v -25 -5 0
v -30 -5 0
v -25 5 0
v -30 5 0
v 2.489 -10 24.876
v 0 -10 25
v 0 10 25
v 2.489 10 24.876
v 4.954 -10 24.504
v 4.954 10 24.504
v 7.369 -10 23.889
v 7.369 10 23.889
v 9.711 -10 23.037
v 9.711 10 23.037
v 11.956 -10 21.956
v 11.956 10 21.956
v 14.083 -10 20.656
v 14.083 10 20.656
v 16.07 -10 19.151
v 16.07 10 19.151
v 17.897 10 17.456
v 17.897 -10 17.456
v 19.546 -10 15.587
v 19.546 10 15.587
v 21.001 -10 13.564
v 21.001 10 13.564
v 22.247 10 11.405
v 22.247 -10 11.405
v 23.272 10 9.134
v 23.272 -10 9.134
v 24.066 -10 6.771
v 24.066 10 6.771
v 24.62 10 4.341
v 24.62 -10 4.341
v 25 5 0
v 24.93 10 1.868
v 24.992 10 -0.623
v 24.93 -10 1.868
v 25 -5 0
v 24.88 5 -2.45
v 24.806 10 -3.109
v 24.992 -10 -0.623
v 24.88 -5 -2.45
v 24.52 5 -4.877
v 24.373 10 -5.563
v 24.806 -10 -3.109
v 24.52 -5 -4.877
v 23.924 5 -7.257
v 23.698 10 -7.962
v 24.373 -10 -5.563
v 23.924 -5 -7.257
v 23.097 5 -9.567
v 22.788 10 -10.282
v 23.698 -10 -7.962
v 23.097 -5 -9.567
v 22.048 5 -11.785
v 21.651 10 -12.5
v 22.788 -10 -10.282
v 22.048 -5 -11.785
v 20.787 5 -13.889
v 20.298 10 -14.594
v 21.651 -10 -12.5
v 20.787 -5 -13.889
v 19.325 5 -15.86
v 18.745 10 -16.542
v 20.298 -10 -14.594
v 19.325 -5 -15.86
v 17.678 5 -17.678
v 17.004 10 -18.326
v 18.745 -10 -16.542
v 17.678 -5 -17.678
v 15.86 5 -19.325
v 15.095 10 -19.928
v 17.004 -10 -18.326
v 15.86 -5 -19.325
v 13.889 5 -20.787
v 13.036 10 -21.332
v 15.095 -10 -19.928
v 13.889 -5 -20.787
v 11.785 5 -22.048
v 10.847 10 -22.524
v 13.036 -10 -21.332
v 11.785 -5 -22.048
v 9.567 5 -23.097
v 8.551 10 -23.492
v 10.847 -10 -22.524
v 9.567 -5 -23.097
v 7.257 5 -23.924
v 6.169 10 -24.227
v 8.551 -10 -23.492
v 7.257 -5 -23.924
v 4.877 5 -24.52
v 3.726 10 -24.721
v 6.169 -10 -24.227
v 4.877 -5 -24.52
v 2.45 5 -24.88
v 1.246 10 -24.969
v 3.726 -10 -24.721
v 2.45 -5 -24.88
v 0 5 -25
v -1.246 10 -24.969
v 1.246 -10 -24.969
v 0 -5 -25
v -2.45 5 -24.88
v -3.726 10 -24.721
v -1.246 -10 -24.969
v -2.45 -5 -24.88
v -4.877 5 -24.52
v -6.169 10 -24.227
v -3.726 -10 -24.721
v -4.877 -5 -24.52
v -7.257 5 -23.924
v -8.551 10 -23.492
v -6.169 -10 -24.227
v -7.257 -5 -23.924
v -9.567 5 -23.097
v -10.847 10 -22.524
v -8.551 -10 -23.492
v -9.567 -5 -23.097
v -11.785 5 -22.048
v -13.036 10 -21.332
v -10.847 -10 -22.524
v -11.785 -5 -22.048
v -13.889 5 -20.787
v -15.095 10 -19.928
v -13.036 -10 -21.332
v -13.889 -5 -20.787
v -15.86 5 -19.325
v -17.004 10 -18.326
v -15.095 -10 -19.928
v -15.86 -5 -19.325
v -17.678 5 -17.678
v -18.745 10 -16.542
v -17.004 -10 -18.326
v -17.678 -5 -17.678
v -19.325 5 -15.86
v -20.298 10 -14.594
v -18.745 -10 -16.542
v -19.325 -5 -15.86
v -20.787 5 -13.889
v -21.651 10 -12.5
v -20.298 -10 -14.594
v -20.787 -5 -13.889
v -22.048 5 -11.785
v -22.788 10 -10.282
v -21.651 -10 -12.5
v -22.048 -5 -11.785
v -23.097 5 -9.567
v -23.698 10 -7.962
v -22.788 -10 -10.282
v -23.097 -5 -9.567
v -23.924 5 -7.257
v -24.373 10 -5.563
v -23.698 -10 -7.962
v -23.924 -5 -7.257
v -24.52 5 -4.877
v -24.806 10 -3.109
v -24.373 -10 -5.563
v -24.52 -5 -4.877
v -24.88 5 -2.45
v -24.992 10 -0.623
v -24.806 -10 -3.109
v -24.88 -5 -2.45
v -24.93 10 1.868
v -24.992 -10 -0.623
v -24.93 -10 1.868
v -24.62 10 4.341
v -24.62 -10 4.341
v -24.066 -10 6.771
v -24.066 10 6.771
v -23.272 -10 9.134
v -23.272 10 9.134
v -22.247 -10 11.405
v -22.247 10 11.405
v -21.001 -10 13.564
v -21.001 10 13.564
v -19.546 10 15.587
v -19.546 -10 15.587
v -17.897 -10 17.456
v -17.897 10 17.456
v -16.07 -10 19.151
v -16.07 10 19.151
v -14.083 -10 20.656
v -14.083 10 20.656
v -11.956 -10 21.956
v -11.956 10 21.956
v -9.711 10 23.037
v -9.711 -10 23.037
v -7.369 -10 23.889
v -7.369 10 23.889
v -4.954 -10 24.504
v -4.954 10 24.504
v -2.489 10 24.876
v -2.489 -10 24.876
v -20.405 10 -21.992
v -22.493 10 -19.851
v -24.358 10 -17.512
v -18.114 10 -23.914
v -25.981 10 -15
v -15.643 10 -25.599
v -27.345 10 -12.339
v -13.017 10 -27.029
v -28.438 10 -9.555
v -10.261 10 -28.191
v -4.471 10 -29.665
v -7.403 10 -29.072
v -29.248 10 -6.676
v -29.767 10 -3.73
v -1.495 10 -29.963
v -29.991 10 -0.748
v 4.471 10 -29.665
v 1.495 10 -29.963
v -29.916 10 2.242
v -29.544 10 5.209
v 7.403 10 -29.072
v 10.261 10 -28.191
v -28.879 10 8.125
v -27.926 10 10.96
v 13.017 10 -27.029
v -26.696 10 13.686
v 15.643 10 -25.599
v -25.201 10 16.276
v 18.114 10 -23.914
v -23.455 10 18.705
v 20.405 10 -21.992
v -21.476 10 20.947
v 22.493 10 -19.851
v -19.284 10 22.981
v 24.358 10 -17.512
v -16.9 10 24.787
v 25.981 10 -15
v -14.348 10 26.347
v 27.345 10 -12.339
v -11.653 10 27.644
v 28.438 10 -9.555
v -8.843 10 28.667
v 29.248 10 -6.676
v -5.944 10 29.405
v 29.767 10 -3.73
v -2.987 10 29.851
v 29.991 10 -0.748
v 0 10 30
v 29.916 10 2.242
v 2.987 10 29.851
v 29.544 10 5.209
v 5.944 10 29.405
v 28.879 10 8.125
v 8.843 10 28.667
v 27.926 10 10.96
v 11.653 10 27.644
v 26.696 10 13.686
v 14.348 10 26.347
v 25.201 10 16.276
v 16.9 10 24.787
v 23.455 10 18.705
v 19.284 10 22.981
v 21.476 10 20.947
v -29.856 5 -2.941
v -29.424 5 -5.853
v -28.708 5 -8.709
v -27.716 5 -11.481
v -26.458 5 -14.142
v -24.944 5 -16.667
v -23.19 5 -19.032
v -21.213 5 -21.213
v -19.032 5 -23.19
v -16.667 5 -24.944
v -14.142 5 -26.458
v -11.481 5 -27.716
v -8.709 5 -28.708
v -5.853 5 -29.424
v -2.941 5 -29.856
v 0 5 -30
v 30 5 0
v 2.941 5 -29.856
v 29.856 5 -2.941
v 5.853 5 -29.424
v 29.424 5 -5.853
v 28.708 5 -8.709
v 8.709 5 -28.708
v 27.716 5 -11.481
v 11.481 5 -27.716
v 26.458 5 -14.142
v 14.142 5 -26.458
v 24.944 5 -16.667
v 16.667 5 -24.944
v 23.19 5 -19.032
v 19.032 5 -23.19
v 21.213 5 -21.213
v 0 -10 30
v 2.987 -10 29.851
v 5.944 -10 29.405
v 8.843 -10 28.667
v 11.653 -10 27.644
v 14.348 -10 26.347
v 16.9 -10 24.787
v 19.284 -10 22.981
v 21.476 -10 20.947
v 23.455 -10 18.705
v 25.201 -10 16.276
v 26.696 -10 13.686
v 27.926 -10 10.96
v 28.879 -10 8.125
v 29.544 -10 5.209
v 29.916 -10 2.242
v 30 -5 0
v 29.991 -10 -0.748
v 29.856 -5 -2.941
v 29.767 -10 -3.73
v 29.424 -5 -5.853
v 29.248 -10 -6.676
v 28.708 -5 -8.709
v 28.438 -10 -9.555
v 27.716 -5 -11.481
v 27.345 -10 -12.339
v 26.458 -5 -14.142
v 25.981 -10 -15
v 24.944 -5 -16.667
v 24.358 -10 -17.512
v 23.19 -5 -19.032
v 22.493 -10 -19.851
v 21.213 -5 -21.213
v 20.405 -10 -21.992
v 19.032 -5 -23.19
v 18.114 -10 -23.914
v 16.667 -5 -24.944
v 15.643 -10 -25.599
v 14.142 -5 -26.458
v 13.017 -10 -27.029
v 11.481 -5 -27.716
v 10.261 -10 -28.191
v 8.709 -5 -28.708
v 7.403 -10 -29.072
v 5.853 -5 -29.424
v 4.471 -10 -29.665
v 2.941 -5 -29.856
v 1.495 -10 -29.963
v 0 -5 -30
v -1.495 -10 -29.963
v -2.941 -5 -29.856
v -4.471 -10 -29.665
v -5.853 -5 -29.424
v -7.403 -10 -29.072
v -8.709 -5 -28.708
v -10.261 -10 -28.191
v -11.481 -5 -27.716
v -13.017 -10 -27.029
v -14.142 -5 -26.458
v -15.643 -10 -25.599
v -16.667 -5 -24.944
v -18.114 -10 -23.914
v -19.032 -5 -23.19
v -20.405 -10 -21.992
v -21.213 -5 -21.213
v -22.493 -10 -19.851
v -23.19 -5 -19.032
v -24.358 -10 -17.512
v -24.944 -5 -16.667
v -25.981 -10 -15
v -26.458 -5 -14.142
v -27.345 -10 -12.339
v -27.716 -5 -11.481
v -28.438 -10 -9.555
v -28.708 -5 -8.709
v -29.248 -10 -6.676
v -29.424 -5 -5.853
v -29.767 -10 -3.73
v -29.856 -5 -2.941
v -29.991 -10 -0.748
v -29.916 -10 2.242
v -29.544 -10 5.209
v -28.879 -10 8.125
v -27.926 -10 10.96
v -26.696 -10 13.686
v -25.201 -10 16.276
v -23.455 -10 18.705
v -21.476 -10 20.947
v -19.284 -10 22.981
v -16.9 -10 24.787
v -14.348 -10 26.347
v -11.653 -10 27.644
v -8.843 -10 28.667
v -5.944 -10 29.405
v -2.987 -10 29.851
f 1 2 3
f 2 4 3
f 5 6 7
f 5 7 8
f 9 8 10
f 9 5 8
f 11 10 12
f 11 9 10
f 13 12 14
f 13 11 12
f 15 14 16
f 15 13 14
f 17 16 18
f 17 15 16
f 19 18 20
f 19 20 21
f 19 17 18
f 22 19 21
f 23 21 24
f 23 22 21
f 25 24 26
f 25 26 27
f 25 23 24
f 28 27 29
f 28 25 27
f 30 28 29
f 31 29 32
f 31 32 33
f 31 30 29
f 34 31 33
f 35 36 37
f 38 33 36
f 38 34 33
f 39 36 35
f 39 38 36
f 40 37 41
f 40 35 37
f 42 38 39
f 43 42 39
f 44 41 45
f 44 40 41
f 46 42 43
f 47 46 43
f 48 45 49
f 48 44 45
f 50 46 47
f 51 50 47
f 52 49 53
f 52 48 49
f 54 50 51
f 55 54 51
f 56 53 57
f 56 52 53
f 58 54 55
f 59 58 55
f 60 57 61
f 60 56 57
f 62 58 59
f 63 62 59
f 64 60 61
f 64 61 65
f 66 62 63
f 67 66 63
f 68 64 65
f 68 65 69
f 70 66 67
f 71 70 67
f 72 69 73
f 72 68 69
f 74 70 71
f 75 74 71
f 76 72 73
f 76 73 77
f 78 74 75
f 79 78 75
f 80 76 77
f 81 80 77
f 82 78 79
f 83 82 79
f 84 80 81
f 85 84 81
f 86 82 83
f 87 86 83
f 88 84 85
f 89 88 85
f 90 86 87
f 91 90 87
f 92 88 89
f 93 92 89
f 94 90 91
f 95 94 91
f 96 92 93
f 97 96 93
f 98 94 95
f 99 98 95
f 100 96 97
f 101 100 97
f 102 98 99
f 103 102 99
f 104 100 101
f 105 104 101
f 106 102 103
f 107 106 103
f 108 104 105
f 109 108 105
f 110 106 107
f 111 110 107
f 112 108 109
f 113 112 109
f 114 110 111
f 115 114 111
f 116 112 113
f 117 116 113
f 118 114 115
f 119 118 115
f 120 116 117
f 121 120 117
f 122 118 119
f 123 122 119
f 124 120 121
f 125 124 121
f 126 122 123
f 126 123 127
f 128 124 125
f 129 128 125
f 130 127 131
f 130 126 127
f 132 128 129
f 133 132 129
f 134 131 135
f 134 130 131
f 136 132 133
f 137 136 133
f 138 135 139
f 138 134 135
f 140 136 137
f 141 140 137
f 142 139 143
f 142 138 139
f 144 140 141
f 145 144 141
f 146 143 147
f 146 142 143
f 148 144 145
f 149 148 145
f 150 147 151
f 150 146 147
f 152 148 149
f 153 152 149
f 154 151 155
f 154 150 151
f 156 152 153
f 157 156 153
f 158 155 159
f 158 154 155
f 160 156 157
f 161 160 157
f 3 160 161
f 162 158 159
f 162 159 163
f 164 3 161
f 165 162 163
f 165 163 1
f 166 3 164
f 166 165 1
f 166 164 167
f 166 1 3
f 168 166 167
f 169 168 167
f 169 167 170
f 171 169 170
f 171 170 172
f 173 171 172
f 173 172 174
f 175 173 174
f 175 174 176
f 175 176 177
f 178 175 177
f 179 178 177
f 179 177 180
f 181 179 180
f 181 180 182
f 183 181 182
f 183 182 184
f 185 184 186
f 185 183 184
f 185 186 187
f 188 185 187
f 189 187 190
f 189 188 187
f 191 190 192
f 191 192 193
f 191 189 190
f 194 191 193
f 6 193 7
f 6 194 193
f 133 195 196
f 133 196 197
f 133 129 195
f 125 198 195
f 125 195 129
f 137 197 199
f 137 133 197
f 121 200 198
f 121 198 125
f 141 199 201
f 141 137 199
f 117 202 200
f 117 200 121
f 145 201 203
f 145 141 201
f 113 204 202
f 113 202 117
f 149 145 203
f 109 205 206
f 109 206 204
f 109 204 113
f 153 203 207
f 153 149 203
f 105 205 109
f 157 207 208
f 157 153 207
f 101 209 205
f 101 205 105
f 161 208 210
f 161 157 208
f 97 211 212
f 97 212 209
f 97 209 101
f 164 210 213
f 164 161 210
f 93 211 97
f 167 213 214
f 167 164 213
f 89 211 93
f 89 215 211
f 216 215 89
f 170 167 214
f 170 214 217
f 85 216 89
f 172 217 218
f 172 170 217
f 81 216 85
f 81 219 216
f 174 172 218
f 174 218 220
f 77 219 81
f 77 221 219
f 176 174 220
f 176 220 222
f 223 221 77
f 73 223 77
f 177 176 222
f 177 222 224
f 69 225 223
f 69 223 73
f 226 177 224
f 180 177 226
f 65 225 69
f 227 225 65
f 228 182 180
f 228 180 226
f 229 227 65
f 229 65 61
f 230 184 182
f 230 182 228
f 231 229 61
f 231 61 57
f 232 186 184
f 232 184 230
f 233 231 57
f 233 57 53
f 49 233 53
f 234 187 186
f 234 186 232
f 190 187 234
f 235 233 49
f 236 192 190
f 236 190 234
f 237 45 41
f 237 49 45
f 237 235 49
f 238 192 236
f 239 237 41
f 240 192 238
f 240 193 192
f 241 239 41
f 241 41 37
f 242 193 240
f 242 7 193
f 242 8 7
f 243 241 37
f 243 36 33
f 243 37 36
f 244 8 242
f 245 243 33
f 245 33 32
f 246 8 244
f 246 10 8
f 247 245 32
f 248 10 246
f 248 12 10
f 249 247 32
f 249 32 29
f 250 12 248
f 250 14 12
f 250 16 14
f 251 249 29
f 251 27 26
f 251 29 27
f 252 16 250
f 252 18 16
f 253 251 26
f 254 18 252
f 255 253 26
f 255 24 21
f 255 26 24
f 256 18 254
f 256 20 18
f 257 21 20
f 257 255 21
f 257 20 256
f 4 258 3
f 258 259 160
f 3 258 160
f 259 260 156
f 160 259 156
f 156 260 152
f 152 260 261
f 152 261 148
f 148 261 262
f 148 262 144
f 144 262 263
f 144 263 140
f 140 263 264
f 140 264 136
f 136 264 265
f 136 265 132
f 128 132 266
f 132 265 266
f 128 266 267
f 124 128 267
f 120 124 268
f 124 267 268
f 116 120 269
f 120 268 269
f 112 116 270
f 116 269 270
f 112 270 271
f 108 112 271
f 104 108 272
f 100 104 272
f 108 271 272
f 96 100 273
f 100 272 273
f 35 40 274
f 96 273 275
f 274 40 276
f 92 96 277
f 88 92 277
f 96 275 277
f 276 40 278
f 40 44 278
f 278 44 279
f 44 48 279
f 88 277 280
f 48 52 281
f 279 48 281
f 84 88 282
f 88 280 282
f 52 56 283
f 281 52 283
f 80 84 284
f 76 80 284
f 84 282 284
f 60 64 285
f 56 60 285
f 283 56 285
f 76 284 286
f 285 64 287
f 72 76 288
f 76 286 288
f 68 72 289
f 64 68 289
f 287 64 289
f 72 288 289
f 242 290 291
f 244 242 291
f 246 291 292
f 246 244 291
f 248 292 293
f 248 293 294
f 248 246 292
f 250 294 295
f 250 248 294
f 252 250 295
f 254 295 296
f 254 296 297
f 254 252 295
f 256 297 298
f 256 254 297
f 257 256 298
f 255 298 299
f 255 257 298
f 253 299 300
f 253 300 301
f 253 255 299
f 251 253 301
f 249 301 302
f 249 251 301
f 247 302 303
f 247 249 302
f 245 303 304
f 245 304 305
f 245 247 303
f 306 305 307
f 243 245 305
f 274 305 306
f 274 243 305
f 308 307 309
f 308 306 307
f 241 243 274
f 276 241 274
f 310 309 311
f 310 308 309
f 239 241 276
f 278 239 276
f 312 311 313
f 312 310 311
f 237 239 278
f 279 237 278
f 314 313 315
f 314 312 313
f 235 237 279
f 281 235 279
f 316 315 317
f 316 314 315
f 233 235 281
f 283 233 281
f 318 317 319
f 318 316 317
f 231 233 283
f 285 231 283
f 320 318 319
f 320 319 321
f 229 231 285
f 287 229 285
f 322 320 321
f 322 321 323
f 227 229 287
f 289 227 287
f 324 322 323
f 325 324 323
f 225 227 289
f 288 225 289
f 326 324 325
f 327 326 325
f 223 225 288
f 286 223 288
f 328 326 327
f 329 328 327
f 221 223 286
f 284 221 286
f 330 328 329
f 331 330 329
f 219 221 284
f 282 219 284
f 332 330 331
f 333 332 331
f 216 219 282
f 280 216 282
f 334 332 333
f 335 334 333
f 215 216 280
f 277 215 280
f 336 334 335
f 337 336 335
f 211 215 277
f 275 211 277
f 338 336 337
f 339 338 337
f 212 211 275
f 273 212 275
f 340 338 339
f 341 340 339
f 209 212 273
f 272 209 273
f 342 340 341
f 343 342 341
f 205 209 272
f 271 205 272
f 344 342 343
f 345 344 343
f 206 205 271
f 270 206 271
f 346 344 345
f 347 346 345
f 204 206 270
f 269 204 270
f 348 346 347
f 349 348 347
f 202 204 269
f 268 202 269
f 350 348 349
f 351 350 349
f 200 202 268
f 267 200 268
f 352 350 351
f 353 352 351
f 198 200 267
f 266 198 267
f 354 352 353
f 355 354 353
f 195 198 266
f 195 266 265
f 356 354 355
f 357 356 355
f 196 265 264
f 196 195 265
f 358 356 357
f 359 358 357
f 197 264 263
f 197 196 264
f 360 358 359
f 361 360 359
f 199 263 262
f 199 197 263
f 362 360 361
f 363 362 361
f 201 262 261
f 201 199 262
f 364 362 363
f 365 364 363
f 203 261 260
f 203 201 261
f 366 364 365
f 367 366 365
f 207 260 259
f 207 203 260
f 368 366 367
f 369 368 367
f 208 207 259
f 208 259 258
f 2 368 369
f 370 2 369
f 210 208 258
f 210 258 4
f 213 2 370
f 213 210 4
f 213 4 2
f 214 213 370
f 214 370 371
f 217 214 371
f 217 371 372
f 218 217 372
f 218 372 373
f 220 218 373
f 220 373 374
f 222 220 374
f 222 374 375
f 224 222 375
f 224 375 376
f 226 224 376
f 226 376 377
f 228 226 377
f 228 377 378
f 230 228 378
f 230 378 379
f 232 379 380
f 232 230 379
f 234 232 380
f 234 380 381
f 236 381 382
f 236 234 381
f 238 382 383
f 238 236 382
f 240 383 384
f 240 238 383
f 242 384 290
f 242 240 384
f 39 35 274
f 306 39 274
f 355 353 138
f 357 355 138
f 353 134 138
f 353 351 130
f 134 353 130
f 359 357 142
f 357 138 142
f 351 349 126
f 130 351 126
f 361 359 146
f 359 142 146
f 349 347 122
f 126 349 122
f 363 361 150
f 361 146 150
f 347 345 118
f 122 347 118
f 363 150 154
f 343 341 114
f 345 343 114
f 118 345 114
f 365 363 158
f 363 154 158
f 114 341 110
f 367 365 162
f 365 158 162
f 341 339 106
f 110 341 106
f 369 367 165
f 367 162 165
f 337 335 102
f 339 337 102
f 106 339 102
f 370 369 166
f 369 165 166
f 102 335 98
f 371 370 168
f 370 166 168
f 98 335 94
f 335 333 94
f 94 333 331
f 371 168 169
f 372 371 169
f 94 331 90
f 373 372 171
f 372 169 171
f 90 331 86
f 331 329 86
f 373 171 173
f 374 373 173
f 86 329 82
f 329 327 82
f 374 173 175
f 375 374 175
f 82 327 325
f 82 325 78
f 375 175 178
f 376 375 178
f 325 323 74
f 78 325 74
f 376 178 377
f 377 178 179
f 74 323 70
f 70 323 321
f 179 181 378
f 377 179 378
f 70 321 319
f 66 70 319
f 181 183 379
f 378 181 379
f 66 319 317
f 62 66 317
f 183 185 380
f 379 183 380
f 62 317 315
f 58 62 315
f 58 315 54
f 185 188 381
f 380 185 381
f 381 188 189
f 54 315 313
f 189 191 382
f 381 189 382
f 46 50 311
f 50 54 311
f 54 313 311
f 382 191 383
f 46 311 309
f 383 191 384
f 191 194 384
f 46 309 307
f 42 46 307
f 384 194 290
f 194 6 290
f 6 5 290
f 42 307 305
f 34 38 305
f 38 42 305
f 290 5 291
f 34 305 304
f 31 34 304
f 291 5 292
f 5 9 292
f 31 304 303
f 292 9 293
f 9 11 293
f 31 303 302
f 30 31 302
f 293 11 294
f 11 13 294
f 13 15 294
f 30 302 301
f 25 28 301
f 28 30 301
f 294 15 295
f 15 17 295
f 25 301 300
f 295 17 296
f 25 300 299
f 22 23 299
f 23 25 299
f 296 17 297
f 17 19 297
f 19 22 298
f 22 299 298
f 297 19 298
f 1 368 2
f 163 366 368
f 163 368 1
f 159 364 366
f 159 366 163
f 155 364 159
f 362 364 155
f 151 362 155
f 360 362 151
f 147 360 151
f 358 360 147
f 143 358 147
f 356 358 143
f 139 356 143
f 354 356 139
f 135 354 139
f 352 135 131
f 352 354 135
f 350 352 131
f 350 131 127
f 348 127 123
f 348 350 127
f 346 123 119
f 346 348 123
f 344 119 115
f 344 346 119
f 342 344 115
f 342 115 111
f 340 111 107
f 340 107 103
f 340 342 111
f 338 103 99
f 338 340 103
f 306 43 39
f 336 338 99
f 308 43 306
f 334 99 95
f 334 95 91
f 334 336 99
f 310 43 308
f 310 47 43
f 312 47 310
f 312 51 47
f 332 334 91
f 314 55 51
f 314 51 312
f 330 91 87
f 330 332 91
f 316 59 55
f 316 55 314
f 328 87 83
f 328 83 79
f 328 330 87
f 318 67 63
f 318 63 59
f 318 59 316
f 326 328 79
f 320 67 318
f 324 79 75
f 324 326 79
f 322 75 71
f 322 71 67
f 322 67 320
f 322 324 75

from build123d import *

# Parameters (mm, degrees)
SKETCH1_R           = 30
SKETCH1_R_2         = 25
BOSS_EXTRUDE1_DEPTH = 10
CUT_EXTRUDE1_DEPTH  = 5


with BuildPart() as part:
    # Sketch1 → Boss-Extrude1 (new, symmetric)
    with BuildSketch(Plane(origin=(0, 0, 0), x_dir=(1, 0, 0), z_dir=(0, 1, 0))):
        with Locations(Location((0, 0, 0), (0, 0, 270))):
            Circle(SKETCH1_R)
        with Locations(Location((0, 0, 0), (0, 0, 270))):
            Circle(SKETCH1_R_2, mode=Mode.SUBTRACT)
    extrude(amount=BOSS_EXTRUDE1_DEPTH, both=True)

    # Sketch3 → Cut-Extrude1 (cut, symmetric)
    with BuildSketch(Plane(origin=(0, 0, 0), x_dir=(1, 0, 0), z_dir=(0, 1, 0))):
        with BuildLine():
            ThreePointArc((-25, 0), (0, 25), (25, 0))
            Line((25, 0), (30, 0))
            ThreePointArc((30, 0), (0, 30), (-30, 0))
            Line((-30, 0), (-25, 0))
        make_face()
    extrude(amount=CUT_EXTRUDE1_DEPTH, both=True, mode=Mode.SUBTRACT)


solid = part.part
